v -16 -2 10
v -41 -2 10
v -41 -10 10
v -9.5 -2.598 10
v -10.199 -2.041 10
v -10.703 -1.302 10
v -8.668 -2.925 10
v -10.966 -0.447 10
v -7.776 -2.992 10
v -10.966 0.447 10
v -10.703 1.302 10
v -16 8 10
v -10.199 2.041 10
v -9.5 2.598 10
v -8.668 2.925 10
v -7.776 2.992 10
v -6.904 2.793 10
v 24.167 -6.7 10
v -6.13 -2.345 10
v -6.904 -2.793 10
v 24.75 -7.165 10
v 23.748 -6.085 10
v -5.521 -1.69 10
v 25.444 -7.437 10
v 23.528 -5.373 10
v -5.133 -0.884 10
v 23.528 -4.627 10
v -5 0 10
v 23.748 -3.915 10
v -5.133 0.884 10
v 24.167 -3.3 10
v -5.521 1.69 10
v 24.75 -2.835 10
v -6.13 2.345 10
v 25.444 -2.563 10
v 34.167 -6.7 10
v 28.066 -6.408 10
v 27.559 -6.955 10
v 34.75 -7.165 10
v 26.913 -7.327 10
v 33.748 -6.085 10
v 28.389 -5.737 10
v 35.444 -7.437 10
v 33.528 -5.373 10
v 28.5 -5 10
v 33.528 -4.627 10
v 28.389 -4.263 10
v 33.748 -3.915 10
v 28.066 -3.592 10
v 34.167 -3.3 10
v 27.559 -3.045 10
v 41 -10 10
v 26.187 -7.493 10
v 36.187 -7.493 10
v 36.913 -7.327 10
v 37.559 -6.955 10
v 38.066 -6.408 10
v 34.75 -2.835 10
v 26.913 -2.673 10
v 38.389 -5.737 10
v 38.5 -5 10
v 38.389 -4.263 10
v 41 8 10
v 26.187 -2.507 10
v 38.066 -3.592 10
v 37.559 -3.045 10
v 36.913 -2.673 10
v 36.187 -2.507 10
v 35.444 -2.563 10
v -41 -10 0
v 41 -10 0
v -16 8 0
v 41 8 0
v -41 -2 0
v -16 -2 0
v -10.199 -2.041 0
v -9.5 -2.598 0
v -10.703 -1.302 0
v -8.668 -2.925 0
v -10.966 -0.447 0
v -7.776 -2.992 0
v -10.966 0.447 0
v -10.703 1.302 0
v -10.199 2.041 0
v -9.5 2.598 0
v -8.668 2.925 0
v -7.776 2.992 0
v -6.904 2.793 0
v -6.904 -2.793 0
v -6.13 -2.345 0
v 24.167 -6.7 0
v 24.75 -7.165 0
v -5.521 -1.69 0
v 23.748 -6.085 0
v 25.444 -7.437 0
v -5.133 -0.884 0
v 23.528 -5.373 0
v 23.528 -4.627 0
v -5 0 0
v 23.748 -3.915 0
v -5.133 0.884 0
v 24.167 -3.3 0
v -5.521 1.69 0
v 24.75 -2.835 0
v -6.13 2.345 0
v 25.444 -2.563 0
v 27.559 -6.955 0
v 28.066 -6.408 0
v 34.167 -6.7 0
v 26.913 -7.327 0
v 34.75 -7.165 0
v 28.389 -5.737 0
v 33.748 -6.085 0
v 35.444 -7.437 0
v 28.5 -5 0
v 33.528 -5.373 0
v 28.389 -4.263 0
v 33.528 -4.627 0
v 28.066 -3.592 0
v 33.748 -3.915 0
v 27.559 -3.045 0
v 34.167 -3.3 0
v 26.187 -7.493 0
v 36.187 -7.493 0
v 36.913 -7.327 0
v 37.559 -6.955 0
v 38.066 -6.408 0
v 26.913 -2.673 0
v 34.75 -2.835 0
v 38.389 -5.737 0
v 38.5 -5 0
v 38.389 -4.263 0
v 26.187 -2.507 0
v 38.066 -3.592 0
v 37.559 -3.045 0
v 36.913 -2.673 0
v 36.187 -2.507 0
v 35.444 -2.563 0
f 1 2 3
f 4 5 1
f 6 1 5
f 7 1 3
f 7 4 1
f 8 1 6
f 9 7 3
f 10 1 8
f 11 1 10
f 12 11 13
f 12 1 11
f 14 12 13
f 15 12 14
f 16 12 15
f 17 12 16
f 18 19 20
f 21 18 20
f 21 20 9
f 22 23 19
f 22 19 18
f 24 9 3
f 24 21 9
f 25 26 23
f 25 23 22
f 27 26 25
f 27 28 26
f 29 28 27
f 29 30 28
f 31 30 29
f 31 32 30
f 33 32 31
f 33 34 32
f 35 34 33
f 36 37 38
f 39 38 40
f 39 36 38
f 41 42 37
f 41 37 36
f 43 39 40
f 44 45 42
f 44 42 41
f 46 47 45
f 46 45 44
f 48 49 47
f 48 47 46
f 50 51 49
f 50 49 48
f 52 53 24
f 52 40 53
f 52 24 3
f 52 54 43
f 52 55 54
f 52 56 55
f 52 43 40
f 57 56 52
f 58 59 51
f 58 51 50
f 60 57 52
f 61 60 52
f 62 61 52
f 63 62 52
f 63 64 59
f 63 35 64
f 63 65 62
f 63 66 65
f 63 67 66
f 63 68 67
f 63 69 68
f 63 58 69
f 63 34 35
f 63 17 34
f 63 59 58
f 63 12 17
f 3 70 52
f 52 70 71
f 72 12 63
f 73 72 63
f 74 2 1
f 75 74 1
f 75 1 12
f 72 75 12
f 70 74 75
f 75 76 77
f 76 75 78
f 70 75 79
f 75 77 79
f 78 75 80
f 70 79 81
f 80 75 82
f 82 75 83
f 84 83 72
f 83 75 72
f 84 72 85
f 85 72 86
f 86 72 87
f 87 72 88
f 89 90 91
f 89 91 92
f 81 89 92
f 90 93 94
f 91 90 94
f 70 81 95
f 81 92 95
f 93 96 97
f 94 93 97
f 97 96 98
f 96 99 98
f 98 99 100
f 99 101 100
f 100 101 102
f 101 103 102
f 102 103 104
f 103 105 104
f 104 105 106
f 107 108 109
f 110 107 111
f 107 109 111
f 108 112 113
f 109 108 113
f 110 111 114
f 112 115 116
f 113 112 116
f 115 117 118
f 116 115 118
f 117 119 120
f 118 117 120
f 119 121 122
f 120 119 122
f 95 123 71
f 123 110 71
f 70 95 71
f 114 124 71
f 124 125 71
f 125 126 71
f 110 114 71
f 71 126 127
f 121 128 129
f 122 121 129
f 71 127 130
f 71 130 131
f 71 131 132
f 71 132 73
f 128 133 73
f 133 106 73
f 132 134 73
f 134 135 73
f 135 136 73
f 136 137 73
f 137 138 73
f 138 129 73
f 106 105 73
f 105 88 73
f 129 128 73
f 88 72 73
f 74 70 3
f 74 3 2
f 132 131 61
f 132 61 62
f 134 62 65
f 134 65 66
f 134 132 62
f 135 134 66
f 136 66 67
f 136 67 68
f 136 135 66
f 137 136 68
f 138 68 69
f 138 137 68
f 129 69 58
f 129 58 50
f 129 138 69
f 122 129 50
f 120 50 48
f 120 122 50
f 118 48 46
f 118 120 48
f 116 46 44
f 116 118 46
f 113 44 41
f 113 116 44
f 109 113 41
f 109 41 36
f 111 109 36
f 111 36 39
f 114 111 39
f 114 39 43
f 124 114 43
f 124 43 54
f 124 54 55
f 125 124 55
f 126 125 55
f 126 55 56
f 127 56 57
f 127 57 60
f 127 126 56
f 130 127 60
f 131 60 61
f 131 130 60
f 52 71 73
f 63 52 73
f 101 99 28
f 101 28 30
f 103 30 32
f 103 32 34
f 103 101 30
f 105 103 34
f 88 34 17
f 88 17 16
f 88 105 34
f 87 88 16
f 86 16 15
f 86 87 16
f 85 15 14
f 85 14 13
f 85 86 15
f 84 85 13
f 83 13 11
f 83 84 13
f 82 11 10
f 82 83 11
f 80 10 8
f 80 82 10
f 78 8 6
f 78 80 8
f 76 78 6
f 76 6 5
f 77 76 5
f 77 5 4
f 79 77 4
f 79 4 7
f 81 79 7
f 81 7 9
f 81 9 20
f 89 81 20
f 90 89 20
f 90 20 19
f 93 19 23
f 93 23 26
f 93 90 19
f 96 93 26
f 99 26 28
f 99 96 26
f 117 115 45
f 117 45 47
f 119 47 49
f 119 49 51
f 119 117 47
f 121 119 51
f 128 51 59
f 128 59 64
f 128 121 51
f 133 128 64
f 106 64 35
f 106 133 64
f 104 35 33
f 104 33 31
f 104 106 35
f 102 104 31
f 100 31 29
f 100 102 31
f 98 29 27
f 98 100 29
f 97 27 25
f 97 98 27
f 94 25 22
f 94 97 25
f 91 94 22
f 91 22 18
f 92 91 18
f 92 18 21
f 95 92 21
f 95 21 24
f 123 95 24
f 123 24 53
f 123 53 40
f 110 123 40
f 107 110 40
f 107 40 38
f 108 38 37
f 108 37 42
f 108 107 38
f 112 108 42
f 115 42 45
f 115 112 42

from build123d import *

# Parameters (mm, degrees)
F0_W     = 82
F0_H     = 20
F0_R     = 2.5
F0_R_2   = 3
F1_DEPTH = 10
F2_W     = 57
F2_H     = 2
F3_DEPTH = 10


# Not quite as in the source:
# - a feature names something its author has since deleted; it is built from what else it names


with BuildPart() as f1:
    # F0 (on Top) → F1 (new body)
    with BuildSketch(Plane.XY):
        Rectangle(F0_W, F0_H)
        with Locations((26, -5)):
            Circle(F0_R, mode=Mode.SUBTRACT)
        with Locations((36, -5)):
            Circle(F0_R, mode=Mode.SUBTRACT)
        with Locations((-8, 0)):
            Circle(F0_R_2, mode=Mode.SUBTRACT)
    extrude(amount=F1_DEPTH)

    # F2 (on face) → F3 (cut)
    with BuildSketch(Plane.XY.offset(10)):
        Polygon((-16, 10), (-41, 10), (-41, -2), (-16, -2), (-16, 8), align=None)
        with Locations((12.5, 9)):
            Rectangle(F2_W, F2_H)
    extrude(amount=-F3_DEPTH, mode=Mode.SUBTRACT)


solid = f1.part
